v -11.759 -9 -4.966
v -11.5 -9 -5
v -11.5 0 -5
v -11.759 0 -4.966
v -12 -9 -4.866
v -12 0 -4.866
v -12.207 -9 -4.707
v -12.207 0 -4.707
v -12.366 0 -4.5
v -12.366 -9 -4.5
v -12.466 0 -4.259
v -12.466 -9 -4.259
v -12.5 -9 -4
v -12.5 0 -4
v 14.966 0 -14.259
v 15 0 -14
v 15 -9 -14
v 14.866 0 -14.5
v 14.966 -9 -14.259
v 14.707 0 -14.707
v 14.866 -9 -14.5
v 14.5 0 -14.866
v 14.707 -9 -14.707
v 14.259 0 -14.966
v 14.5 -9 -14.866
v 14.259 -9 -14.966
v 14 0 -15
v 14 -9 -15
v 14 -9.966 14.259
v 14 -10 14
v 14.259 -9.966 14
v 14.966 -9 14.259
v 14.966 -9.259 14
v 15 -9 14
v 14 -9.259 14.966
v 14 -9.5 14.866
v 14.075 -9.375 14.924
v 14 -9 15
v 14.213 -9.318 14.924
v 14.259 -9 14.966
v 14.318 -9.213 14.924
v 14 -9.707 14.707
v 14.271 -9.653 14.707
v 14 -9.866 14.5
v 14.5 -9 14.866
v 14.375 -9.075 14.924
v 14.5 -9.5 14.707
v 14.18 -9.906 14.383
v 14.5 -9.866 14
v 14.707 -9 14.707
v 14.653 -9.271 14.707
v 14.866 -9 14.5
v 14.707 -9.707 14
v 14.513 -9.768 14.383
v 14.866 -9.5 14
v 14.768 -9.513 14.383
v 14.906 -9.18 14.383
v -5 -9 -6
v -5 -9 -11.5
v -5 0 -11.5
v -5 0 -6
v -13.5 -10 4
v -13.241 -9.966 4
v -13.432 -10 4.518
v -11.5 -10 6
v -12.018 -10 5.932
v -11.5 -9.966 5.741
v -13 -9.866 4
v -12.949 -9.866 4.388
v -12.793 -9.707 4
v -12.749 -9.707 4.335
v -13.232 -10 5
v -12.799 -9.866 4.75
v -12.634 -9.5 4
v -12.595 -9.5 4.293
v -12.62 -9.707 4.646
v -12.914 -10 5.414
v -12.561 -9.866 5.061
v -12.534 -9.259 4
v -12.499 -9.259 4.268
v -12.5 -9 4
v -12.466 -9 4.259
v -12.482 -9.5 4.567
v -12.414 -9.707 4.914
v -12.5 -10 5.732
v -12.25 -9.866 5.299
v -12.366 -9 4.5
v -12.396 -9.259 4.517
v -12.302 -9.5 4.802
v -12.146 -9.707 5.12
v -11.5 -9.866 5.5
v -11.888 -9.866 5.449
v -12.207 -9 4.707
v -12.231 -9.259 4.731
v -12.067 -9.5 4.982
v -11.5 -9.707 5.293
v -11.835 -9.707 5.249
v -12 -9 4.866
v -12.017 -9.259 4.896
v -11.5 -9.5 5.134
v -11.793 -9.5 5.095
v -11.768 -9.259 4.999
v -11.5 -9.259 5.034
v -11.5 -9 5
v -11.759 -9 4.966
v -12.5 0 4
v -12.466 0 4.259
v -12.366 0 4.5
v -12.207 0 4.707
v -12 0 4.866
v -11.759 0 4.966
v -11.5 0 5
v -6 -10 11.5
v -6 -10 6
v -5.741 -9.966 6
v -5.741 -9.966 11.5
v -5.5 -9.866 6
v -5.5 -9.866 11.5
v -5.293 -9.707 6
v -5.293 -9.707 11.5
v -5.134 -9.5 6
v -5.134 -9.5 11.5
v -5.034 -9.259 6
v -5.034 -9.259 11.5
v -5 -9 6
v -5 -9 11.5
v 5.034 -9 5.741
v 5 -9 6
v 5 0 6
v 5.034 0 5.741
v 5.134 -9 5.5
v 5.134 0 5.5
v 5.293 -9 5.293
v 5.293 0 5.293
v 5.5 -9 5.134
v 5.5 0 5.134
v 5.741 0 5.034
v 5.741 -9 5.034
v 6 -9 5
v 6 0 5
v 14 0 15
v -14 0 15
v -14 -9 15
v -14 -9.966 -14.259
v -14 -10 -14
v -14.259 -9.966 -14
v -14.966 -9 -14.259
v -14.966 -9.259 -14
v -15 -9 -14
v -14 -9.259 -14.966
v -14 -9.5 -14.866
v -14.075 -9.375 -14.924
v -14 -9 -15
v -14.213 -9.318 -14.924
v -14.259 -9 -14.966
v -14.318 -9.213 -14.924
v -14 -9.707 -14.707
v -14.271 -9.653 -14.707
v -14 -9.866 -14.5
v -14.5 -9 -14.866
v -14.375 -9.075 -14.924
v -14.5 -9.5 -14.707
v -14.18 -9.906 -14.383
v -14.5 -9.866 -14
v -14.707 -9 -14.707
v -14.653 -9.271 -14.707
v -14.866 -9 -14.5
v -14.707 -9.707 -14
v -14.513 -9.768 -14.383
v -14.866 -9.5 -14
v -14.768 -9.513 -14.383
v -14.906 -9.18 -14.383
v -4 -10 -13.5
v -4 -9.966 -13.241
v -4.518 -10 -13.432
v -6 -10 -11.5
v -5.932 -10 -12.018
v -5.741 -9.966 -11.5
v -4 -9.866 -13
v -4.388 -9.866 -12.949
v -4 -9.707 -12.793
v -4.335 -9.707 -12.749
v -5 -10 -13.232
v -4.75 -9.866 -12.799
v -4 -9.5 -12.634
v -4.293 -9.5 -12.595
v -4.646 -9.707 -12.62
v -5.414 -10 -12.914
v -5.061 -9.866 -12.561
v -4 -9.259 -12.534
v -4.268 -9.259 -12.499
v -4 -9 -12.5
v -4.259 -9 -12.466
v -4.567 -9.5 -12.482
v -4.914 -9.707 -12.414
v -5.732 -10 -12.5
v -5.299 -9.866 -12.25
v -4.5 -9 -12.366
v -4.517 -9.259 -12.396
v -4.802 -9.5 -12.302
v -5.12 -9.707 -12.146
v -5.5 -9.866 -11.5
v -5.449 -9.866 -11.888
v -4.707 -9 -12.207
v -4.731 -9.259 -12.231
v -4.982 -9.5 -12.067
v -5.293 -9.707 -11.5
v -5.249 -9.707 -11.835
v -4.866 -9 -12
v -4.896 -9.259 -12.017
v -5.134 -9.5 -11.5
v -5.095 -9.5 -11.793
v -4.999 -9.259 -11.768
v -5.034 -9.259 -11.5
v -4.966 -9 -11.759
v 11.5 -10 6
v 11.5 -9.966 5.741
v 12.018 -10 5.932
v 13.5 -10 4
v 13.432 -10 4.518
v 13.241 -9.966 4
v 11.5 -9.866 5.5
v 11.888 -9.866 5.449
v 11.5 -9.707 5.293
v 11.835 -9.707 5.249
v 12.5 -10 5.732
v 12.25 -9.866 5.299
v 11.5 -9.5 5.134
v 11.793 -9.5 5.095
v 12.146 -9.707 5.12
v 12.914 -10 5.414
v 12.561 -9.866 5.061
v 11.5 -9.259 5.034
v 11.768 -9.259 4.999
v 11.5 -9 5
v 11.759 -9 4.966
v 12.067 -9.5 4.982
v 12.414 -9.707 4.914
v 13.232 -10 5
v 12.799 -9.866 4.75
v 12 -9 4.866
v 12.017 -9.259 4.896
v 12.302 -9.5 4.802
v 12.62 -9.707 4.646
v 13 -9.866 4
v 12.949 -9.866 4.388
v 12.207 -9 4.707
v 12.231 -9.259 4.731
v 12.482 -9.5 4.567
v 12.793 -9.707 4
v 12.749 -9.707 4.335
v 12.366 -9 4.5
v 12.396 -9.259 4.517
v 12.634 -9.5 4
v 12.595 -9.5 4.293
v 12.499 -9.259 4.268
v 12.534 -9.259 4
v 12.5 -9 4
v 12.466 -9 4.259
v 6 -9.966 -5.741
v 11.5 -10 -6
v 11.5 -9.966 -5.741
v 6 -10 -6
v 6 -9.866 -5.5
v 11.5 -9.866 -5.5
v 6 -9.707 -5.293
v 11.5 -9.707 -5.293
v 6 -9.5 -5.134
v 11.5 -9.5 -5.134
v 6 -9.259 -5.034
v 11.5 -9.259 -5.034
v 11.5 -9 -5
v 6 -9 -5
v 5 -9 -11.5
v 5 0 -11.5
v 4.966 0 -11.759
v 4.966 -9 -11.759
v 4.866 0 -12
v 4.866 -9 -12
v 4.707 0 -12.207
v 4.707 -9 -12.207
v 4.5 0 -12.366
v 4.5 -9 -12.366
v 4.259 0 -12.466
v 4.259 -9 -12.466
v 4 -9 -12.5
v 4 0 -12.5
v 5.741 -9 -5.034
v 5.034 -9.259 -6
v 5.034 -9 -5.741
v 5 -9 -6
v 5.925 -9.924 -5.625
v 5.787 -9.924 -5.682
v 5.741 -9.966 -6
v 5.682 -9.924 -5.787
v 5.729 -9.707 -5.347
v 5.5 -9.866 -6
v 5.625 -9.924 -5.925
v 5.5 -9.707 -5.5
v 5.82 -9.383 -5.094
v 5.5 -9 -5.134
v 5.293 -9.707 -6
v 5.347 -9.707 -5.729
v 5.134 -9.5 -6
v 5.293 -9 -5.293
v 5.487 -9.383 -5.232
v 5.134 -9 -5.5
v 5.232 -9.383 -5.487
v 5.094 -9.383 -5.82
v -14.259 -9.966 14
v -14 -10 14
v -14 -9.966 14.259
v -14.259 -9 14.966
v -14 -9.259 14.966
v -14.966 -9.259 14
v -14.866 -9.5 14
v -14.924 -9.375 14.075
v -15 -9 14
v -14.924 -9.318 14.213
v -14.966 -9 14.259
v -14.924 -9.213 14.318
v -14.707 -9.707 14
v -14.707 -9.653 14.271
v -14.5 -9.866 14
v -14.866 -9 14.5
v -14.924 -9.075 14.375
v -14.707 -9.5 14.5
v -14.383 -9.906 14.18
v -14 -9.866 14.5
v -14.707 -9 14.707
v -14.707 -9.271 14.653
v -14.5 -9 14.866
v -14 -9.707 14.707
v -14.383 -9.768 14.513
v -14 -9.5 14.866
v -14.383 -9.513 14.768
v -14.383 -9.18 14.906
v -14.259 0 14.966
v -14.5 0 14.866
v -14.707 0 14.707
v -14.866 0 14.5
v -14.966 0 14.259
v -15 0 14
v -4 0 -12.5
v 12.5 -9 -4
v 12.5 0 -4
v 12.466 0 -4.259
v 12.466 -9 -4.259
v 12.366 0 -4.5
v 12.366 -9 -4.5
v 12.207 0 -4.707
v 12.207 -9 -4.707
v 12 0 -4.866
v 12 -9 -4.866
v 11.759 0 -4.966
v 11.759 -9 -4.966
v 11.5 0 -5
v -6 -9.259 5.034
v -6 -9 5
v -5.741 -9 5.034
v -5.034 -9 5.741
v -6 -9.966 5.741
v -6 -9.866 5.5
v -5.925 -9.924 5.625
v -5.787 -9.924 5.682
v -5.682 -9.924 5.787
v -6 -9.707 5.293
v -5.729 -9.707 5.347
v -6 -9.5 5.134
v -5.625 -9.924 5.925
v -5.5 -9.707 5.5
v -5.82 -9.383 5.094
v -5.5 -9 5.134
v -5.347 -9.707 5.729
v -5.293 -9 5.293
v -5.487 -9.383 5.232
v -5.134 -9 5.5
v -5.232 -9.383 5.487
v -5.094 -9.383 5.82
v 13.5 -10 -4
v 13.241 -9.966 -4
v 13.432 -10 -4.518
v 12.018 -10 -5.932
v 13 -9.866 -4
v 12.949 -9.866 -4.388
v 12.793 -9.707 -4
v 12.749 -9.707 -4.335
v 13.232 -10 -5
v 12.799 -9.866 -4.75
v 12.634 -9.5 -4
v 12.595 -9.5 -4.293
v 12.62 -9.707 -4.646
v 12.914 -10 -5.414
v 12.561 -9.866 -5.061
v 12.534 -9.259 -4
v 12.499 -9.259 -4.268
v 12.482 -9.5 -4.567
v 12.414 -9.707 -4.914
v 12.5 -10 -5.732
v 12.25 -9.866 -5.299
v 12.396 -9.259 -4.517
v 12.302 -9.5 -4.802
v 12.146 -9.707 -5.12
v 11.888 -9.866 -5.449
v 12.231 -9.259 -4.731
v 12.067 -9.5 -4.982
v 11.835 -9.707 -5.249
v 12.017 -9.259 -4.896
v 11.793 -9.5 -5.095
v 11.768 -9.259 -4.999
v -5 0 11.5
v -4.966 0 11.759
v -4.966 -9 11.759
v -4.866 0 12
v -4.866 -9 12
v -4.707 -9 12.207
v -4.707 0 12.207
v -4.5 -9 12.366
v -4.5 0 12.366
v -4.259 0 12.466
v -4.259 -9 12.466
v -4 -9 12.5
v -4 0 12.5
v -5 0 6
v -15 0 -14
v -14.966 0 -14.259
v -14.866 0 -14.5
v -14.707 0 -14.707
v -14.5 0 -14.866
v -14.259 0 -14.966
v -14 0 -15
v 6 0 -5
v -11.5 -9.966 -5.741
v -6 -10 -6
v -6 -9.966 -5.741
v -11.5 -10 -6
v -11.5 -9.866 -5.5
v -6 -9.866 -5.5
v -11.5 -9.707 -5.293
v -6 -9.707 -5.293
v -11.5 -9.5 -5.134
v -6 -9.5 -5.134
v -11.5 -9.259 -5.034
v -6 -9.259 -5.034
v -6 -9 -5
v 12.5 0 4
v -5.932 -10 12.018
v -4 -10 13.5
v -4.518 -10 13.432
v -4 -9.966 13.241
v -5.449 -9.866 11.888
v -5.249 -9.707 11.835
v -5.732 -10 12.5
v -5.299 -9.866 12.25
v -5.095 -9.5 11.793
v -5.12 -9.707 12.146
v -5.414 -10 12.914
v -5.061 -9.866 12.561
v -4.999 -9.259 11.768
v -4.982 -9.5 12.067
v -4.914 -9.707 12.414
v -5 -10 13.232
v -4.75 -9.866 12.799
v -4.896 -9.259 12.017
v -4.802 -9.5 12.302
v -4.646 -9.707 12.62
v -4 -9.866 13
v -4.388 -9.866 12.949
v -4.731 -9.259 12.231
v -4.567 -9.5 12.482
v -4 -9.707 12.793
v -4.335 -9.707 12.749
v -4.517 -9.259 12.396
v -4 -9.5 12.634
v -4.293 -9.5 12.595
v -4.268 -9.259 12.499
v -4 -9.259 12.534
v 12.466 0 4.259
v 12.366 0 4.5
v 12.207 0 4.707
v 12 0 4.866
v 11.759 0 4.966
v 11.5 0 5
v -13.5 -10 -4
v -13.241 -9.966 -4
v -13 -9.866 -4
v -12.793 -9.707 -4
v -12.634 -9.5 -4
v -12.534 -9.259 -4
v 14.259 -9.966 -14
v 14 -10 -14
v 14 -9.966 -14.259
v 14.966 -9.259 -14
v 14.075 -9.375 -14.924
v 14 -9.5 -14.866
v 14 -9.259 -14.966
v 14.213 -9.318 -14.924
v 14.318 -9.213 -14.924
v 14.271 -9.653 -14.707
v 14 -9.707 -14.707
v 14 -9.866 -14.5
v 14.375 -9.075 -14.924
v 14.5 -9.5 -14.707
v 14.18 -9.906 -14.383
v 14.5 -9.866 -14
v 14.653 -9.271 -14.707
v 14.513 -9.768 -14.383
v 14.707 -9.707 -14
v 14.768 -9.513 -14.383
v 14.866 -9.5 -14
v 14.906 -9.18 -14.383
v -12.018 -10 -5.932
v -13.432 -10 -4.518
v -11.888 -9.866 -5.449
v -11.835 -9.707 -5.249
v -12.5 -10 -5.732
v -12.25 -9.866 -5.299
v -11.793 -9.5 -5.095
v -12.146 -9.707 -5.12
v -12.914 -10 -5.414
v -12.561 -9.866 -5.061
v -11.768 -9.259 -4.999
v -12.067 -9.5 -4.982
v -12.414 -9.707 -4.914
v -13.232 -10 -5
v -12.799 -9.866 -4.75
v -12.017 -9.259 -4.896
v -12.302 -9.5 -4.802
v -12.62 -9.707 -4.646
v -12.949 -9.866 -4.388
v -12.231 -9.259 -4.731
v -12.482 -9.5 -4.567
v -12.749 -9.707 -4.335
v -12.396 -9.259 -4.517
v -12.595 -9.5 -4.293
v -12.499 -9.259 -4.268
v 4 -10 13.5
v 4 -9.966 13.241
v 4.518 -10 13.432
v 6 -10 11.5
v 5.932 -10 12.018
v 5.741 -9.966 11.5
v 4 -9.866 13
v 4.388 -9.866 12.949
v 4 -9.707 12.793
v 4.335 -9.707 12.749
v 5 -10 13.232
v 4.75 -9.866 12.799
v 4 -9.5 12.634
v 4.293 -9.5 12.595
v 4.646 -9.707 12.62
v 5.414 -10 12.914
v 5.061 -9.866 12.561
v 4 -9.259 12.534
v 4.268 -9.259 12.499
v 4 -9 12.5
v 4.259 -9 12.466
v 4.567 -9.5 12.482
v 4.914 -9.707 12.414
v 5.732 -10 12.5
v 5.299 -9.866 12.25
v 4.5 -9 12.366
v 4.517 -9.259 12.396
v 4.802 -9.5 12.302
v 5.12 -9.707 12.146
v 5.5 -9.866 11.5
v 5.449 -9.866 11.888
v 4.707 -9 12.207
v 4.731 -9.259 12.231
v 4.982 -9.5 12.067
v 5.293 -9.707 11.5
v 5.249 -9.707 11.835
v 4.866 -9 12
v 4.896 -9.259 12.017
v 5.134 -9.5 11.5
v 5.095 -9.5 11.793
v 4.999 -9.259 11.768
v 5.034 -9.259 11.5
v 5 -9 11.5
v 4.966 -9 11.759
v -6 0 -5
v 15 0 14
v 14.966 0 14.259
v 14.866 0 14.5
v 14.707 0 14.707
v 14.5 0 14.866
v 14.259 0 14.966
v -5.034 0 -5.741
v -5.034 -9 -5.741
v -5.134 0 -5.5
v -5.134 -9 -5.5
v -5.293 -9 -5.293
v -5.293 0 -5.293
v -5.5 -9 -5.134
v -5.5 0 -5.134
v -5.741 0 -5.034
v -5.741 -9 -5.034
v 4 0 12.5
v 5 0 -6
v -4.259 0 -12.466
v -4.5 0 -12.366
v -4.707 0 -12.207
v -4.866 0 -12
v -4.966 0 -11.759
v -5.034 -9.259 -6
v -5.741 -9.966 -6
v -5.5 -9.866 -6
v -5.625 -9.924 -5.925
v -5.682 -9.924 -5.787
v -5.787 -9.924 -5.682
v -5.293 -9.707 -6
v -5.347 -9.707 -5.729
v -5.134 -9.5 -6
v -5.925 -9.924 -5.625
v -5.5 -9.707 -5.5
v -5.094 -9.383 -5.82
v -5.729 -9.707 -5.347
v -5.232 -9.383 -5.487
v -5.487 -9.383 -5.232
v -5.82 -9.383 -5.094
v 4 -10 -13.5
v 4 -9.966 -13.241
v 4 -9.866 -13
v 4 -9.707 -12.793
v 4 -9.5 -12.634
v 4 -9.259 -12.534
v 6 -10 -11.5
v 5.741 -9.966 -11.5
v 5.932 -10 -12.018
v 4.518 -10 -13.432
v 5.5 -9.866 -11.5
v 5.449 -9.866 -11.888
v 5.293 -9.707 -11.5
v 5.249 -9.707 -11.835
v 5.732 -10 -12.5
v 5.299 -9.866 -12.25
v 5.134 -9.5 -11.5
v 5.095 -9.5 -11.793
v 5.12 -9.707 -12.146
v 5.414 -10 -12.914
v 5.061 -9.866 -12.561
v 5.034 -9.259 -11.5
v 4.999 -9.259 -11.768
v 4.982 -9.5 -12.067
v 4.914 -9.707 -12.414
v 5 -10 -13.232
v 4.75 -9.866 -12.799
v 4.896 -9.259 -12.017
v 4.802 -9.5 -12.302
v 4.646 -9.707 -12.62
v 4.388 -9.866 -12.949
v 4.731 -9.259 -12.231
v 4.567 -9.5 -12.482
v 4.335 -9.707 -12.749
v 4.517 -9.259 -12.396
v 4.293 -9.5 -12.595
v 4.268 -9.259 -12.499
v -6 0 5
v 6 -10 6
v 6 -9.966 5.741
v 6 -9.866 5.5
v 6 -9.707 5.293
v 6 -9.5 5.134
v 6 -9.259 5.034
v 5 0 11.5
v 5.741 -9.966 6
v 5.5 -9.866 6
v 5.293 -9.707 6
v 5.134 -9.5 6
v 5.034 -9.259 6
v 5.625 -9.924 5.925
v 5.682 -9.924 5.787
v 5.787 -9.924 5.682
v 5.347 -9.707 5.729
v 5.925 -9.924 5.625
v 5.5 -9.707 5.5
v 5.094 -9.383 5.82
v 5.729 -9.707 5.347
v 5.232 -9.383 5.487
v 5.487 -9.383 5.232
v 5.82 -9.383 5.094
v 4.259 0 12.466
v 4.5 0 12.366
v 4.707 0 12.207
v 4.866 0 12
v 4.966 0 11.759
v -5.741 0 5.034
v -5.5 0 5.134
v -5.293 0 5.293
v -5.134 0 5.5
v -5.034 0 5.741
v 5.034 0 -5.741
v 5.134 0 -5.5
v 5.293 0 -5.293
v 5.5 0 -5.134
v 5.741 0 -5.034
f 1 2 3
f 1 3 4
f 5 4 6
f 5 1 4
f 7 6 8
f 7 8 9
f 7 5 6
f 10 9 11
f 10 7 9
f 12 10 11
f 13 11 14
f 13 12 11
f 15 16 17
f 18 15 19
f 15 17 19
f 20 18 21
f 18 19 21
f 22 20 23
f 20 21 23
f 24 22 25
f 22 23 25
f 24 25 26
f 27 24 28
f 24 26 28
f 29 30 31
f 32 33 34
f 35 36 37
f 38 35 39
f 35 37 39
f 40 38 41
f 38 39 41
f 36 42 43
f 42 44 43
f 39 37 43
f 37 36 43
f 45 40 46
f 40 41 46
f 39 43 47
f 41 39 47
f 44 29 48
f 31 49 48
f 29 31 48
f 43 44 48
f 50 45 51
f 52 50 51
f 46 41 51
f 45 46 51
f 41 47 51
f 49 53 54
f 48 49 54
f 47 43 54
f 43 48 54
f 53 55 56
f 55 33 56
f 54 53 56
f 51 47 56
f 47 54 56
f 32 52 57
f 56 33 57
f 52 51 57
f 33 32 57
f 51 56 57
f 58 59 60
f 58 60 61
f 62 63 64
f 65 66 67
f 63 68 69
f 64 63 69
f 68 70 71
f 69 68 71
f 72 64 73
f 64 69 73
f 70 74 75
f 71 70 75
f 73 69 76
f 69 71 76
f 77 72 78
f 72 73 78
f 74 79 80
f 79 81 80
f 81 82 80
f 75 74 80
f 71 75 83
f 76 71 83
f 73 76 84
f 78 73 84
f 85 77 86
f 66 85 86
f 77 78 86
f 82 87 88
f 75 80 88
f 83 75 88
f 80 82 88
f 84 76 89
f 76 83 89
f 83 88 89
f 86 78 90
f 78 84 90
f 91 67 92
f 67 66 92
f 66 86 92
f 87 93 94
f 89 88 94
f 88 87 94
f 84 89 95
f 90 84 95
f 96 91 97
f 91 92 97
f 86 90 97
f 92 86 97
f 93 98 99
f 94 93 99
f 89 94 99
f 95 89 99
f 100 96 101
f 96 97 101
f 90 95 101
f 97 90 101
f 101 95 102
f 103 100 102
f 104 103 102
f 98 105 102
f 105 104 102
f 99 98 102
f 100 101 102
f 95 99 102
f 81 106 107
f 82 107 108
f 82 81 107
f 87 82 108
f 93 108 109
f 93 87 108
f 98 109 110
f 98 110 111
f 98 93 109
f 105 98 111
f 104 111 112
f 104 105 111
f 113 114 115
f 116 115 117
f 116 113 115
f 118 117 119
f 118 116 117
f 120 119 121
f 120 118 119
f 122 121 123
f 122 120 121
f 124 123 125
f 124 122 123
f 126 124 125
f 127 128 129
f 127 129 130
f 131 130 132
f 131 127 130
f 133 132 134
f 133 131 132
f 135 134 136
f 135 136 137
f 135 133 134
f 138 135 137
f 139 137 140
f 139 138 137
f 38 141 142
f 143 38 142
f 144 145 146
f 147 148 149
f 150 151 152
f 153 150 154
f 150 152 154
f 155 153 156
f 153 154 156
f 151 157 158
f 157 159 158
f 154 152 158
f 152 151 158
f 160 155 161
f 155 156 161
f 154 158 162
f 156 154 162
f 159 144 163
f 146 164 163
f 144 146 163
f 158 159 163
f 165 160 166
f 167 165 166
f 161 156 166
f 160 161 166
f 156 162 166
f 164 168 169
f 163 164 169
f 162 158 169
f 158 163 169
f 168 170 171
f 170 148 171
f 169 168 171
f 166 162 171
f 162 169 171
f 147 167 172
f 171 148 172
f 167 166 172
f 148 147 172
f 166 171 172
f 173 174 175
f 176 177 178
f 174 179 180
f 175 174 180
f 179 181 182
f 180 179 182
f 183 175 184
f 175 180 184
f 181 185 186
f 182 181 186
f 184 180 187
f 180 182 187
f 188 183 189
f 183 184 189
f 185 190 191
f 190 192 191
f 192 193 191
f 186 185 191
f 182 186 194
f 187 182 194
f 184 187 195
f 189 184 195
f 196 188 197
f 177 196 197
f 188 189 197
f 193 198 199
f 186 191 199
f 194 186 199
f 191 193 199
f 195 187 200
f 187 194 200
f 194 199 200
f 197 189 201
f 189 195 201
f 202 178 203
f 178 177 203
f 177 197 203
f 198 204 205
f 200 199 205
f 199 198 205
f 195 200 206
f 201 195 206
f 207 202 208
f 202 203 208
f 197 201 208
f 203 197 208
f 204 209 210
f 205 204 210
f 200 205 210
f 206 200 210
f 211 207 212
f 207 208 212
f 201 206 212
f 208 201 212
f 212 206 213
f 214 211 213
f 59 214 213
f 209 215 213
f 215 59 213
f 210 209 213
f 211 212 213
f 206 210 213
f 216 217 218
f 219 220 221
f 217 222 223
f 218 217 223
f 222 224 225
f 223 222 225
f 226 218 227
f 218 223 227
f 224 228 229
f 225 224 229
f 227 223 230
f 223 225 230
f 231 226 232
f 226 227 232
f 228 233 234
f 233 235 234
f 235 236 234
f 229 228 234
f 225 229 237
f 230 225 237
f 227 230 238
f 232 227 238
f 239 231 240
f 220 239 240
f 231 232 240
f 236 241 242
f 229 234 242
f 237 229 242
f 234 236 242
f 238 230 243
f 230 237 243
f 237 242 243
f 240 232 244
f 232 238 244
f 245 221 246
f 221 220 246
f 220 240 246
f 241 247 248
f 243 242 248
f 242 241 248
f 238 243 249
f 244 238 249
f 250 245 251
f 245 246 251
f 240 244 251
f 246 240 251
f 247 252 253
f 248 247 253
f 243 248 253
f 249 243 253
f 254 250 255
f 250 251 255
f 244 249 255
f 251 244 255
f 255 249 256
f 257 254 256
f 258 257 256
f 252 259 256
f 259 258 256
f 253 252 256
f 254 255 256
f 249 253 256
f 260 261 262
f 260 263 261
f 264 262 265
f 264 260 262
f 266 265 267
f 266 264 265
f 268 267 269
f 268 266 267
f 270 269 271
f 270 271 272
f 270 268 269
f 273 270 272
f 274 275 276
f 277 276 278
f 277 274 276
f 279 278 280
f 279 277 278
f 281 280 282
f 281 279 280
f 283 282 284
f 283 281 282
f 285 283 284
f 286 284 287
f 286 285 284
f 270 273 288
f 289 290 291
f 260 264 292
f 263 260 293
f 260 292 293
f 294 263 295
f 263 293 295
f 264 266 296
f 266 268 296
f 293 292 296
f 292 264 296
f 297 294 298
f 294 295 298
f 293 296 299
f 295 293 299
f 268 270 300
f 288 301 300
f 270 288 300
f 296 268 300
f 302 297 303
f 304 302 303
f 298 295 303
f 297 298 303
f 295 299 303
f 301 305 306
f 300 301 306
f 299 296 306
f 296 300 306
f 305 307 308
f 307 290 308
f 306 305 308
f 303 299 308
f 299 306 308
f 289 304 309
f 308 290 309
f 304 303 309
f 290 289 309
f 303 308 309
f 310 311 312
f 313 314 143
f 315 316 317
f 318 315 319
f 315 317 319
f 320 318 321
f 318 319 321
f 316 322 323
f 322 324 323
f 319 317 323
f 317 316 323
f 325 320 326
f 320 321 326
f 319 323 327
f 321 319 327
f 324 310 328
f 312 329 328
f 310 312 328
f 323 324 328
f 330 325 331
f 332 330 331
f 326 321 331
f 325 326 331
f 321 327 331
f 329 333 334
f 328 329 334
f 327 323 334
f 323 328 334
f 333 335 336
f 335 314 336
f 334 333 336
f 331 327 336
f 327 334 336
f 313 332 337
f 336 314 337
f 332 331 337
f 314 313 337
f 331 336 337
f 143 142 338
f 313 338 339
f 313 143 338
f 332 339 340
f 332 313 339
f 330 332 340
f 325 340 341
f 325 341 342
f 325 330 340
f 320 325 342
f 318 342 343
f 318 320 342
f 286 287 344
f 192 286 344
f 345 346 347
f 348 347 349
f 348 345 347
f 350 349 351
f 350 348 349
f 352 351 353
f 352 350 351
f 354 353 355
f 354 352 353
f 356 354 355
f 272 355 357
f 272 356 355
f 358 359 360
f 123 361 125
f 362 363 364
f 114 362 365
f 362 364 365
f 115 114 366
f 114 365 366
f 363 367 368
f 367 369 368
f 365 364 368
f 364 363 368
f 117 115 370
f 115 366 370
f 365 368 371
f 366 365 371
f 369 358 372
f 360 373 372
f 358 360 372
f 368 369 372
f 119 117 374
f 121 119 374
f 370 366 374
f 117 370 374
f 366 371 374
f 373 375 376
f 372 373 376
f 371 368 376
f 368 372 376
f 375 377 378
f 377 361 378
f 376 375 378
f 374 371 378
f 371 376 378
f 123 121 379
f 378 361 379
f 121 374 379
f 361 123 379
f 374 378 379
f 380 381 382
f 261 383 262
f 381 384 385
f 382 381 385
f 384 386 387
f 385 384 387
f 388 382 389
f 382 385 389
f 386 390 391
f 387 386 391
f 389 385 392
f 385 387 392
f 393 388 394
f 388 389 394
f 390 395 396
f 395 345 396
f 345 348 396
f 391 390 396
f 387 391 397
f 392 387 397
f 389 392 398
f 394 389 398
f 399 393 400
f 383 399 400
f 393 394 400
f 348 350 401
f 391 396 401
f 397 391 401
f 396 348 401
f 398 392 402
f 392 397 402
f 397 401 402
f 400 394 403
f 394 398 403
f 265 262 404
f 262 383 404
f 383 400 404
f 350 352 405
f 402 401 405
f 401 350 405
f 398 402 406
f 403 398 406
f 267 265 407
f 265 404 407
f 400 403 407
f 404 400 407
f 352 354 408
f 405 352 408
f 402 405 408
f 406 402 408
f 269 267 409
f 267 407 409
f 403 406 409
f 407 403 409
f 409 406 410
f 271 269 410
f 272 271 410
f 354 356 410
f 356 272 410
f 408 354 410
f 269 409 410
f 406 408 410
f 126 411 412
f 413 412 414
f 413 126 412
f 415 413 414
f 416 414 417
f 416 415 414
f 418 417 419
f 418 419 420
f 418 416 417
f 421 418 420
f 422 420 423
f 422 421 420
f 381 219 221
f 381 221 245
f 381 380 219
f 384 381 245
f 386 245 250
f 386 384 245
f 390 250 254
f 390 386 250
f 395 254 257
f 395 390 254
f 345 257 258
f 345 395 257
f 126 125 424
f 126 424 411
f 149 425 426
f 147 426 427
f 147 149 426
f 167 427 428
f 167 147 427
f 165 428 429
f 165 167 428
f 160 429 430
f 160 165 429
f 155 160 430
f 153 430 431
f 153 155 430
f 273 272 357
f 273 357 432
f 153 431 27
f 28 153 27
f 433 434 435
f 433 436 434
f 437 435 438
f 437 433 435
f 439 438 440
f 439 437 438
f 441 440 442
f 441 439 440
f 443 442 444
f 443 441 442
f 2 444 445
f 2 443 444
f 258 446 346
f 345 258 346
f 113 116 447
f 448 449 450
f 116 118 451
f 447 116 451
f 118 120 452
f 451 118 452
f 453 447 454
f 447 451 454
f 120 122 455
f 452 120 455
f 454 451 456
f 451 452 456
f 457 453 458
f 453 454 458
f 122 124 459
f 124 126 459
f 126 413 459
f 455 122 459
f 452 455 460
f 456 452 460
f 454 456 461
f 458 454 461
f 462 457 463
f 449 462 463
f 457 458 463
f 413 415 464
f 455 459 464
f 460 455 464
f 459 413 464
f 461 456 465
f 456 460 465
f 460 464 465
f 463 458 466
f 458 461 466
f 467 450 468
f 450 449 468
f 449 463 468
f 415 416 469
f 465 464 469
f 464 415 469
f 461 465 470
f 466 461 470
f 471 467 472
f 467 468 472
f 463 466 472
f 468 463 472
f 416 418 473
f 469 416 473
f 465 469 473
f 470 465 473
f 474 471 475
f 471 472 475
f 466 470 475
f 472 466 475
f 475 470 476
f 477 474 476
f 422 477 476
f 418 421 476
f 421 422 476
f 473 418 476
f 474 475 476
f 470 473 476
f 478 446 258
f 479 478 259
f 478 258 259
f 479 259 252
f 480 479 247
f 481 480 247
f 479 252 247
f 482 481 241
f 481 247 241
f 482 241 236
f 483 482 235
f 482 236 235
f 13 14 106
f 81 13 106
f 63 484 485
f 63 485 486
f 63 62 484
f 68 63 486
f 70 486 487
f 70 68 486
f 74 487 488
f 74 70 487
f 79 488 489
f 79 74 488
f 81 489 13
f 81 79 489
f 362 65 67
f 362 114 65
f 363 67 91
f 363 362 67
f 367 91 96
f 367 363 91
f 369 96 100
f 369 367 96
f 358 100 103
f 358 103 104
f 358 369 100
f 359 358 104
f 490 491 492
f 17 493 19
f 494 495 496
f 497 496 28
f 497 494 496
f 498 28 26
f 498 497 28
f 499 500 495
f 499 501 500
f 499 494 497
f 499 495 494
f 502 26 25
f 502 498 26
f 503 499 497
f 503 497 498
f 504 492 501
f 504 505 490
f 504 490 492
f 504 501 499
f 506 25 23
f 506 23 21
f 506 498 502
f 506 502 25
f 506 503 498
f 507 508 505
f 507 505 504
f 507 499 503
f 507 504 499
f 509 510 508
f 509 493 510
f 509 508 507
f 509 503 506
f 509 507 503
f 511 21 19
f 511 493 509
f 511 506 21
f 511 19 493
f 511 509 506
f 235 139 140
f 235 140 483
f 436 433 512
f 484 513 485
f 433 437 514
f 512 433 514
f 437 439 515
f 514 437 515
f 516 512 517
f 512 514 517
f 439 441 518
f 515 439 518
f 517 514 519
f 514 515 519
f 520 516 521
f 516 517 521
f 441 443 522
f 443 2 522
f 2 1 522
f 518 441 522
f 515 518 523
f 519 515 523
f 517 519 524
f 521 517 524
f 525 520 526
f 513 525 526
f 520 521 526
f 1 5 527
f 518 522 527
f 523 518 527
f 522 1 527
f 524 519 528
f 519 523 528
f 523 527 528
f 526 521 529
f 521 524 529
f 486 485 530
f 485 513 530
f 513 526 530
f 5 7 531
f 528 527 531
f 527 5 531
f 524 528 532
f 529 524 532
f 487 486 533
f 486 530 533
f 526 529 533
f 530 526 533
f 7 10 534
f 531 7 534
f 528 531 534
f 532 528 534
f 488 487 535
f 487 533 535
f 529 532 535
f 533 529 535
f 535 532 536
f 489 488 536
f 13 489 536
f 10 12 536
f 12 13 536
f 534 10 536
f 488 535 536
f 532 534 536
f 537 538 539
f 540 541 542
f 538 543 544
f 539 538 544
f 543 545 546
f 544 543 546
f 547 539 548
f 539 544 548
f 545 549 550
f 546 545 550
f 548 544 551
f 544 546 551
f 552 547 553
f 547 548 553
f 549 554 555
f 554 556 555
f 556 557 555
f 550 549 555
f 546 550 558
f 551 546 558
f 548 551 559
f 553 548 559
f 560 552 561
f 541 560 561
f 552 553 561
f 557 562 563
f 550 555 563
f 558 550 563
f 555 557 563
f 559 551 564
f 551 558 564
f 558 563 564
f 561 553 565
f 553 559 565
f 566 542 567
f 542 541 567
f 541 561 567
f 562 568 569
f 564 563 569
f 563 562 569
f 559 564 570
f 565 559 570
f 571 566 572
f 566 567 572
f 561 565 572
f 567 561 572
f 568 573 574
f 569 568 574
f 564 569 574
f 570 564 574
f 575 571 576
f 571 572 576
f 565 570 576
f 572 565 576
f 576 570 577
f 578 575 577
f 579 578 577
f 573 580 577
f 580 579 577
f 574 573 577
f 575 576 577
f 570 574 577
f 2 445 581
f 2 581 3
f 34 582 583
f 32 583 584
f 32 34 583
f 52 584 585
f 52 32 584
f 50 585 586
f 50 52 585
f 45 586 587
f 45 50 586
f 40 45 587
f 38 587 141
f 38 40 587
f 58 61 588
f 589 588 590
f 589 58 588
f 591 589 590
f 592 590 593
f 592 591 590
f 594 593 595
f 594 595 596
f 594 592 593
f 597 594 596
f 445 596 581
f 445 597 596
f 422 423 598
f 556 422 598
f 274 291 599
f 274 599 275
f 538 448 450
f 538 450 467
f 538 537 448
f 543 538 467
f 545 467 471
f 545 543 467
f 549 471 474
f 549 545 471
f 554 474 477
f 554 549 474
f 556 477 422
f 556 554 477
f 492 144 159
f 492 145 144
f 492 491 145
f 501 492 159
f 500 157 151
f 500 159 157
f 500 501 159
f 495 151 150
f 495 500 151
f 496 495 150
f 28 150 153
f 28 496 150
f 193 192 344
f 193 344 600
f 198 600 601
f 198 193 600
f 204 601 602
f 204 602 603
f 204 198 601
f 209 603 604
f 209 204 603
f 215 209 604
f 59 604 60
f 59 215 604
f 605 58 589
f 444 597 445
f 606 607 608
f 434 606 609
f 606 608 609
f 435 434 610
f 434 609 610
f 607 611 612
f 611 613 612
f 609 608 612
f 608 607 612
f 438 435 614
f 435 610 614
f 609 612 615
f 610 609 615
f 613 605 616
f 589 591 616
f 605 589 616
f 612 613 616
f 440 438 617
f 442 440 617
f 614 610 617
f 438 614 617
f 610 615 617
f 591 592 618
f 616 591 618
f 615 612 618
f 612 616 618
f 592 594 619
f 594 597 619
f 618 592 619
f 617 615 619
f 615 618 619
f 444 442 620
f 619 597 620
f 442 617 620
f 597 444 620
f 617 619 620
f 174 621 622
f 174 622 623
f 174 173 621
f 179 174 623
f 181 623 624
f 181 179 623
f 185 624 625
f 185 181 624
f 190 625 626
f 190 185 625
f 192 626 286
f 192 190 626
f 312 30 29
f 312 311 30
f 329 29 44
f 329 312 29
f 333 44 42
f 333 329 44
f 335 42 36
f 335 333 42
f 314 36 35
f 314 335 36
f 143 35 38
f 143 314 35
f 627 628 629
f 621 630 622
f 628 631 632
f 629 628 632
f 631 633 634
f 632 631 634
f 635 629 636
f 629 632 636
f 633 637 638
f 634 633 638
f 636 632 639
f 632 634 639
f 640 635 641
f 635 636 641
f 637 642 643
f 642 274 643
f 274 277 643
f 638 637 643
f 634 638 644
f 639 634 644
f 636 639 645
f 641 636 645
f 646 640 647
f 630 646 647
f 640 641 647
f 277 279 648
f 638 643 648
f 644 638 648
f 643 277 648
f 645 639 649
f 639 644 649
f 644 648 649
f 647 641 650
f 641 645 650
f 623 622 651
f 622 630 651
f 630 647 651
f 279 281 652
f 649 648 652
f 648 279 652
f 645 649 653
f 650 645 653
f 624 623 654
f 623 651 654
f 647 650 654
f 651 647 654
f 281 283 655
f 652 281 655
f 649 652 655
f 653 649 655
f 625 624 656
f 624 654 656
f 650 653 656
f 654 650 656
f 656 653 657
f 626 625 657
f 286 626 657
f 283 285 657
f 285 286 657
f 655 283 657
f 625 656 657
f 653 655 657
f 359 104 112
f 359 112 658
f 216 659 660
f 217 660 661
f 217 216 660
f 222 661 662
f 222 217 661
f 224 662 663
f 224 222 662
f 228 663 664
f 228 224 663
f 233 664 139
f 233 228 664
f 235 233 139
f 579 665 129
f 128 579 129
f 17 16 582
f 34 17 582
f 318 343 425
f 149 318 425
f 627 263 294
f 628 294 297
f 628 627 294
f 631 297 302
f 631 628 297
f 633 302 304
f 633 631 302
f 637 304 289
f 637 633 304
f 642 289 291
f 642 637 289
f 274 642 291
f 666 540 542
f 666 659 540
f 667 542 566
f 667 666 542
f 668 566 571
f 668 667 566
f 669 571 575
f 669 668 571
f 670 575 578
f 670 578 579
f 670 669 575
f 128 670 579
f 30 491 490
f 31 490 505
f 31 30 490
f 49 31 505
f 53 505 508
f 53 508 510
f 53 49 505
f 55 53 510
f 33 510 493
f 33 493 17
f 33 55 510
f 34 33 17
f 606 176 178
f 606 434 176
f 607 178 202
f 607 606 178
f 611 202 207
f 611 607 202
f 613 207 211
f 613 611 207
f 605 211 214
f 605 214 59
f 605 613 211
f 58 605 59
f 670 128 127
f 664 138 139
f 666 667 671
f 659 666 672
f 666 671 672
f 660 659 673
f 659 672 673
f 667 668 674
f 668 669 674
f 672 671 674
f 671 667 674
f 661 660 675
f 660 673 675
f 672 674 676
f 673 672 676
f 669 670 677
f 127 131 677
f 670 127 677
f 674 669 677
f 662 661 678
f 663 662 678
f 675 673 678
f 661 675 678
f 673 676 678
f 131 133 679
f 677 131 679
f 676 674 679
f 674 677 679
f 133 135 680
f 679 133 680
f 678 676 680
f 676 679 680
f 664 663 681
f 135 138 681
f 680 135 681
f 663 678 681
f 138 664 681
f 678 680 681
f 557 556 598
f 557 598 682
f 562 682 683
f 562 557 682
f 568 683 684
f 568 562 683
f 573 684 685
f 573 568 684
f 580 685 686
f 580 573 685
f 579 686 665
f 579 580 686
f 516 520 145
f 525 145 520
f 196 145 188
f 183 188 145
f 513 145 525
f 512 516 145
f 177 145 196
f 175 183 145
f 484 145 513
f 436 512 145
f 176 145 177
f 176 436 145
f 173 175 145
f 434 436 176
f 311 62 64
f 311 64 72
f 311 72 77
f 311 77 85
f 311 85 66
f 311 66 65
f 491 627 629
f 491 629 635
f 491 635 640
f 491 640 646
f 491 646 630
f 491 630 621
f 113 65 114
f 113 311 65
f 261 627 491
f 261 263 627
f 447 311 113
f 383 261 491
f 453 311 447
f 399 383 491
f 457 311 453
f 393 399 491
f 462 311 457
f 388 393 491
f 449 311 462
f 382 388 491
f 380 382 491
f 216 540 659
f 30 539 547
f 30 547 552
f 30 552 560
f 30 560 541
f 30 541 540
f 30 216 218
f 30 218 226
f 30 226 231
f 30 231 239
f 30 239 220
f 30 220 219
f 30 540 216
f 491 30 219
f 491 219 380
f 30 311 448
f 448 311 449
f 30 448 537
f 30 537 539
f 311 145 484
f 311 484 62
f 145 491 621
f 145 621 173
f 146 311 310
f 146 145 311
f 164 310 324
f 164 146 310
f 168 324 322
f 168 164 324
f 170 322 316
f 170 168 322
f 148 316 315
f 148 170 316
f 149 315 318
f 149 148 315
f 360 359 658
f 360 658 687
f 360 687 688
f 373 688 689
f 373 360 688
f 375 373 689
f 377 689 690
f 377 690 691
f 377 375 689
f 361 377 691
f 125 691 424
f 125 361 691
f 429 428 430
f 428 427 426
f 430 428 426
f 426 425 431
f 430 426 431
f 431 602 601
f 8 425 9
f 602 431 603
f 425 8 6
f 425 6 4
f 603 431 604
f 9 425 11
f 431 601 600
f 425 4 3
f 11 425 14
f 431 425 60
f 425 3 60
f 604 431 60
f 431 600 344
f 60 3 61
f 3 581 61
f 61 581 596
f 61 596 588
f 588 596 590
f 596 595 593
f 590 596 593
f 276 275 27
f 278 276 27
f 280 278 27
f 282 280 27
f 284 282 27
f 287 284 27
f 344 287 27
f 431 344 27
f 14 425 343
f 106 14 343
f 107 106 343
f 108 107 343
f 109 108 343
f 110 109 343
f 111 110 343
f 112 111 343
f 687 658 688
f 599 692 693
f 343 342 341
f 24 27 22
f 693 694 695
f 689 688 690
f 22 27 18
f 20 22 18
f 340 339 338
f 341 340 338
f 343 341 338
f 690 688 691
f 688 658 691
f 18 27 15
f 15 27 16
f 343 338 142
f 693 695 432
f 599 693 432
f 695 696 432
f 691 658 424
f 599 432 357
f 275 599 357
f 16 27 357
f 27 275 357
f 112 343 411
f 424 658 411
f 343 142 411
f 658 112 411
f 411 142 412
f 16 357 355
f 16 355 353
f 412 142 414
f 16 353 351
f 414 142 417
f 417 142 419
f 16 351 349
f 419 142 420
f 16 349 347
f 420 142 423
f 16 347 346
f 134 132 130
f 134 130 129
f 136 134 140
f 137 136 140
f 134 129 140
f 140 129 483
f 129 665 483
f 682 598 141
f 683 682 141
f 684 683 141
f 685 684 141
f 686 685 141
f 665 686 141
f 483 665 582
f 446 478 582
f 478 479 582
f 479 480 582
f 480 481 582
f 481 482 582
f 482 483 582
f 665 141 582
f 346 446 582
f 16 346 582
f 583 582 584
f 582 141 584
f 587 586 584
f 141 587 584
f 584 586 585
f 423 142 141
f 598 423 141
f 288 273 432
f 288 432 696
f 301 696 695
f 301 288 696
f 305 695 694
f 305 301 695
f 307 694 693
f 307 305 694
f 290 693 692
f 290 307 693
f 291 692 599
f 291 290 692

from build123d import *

# Parameters (mm, degrees)
F0_W     = 7.5
F0_H     = 7.5
F0_W_2   = 2.5
F0_H_2   = 2.5
F1_DEPTH = 10
F2_R     = 1
F3_R     = 1


with BuildPart() as f1:
    # F0 (on Front) → F1 (new body)
    with BuildSketch(Plane.XZ):
        Polygon((5, -12.5), (-5, -12.5), (-5, -7.5), (-7.5, -7.5), (-7.5, -15), (7.5, -15), (7.5, -7.5), (5, -7.5), align=None)
        Polygon((-15, -7.5), (-7.5, -7.5), (-7.5, -5), (-12.5, -5), (-12.5, 5), (-7.5, 5), (-7.5, 7.5), (-15, 7.5), align=None)
        with Locations((-11.25, -11.25)):
            Rectangle(F0_W, F0_H)
        with Locations((11.25, -11.25)):
            Rectangle(F0_W, F0_H)
        Polygon((7.5, -5), (7.5, -7.5), (15, -7.5), (15, 7.5), (7.5, 7.5), (7.5, 5), (12.5, 5), (12.5, -5), align=None)
        Polygon((-7.5, 7.5), (-5, 7.5), (-5, 12.5), (5, 12.5), (5, 7.5), (7.5, 7.5), (7.5, 15), (-7.5, 15), align=None)
        with Locations((-11.25, 11.25)):
            Rectangle(F0_W, F0_H)
        with Locations((11.25, 11.25)):
            Rectangle(F0_W, F0_H)
        with Locations((-6.25, 6.25)):
            Rectangle(F0_W_2, F0_H_2)
        with Locations((6.25, 6.25)):
            Rectangle(F0_W_2, F0_H_2)
        with Locations((6.25, -6.25)):
            Rectangle(F0_W_2, F0_H_2)
        with Locations((-6.25, -6.25)):
            Rectangle(F0_W_2, F0_H_2)
    extrude(amount=F1_DEPTH)

    # F2
    f2_edges = [f1.edges().sort_by_distance(p)[0] for p in [
        (-5, -5, 5),
        (-5, -5, 12.5),
        (-12.5, -5, 5),
        (5, -5, 12.5),
        (5, -5, 5),
        (12.5, -5, 5),
        (12.5, -5, -5),
        (5, -5, -5),
        (5, -5, -12.5),
        (-5, -5, -12.5),
        (-5, -5, -5),
        (-12.5, -5, -5),
    ]]
    fillet(f2_edges, radius=F2_R)

    # F3
    f3_edges = [f1.edges().sort_by_distance(p)[0] for p in [
        (15, -10, 0),
        (0, -10, 15),
        (-15, -10, 0),
        (0, -10, -15),
        (-8.75, -10, -5),
        (-15, -5, -15),
        (15, -5, -15),
        (15, -5, 15),
        (-15, -5, 15),
    ]]
    fillet(f3_edges, radius=F3_R)


solid = f1.part
